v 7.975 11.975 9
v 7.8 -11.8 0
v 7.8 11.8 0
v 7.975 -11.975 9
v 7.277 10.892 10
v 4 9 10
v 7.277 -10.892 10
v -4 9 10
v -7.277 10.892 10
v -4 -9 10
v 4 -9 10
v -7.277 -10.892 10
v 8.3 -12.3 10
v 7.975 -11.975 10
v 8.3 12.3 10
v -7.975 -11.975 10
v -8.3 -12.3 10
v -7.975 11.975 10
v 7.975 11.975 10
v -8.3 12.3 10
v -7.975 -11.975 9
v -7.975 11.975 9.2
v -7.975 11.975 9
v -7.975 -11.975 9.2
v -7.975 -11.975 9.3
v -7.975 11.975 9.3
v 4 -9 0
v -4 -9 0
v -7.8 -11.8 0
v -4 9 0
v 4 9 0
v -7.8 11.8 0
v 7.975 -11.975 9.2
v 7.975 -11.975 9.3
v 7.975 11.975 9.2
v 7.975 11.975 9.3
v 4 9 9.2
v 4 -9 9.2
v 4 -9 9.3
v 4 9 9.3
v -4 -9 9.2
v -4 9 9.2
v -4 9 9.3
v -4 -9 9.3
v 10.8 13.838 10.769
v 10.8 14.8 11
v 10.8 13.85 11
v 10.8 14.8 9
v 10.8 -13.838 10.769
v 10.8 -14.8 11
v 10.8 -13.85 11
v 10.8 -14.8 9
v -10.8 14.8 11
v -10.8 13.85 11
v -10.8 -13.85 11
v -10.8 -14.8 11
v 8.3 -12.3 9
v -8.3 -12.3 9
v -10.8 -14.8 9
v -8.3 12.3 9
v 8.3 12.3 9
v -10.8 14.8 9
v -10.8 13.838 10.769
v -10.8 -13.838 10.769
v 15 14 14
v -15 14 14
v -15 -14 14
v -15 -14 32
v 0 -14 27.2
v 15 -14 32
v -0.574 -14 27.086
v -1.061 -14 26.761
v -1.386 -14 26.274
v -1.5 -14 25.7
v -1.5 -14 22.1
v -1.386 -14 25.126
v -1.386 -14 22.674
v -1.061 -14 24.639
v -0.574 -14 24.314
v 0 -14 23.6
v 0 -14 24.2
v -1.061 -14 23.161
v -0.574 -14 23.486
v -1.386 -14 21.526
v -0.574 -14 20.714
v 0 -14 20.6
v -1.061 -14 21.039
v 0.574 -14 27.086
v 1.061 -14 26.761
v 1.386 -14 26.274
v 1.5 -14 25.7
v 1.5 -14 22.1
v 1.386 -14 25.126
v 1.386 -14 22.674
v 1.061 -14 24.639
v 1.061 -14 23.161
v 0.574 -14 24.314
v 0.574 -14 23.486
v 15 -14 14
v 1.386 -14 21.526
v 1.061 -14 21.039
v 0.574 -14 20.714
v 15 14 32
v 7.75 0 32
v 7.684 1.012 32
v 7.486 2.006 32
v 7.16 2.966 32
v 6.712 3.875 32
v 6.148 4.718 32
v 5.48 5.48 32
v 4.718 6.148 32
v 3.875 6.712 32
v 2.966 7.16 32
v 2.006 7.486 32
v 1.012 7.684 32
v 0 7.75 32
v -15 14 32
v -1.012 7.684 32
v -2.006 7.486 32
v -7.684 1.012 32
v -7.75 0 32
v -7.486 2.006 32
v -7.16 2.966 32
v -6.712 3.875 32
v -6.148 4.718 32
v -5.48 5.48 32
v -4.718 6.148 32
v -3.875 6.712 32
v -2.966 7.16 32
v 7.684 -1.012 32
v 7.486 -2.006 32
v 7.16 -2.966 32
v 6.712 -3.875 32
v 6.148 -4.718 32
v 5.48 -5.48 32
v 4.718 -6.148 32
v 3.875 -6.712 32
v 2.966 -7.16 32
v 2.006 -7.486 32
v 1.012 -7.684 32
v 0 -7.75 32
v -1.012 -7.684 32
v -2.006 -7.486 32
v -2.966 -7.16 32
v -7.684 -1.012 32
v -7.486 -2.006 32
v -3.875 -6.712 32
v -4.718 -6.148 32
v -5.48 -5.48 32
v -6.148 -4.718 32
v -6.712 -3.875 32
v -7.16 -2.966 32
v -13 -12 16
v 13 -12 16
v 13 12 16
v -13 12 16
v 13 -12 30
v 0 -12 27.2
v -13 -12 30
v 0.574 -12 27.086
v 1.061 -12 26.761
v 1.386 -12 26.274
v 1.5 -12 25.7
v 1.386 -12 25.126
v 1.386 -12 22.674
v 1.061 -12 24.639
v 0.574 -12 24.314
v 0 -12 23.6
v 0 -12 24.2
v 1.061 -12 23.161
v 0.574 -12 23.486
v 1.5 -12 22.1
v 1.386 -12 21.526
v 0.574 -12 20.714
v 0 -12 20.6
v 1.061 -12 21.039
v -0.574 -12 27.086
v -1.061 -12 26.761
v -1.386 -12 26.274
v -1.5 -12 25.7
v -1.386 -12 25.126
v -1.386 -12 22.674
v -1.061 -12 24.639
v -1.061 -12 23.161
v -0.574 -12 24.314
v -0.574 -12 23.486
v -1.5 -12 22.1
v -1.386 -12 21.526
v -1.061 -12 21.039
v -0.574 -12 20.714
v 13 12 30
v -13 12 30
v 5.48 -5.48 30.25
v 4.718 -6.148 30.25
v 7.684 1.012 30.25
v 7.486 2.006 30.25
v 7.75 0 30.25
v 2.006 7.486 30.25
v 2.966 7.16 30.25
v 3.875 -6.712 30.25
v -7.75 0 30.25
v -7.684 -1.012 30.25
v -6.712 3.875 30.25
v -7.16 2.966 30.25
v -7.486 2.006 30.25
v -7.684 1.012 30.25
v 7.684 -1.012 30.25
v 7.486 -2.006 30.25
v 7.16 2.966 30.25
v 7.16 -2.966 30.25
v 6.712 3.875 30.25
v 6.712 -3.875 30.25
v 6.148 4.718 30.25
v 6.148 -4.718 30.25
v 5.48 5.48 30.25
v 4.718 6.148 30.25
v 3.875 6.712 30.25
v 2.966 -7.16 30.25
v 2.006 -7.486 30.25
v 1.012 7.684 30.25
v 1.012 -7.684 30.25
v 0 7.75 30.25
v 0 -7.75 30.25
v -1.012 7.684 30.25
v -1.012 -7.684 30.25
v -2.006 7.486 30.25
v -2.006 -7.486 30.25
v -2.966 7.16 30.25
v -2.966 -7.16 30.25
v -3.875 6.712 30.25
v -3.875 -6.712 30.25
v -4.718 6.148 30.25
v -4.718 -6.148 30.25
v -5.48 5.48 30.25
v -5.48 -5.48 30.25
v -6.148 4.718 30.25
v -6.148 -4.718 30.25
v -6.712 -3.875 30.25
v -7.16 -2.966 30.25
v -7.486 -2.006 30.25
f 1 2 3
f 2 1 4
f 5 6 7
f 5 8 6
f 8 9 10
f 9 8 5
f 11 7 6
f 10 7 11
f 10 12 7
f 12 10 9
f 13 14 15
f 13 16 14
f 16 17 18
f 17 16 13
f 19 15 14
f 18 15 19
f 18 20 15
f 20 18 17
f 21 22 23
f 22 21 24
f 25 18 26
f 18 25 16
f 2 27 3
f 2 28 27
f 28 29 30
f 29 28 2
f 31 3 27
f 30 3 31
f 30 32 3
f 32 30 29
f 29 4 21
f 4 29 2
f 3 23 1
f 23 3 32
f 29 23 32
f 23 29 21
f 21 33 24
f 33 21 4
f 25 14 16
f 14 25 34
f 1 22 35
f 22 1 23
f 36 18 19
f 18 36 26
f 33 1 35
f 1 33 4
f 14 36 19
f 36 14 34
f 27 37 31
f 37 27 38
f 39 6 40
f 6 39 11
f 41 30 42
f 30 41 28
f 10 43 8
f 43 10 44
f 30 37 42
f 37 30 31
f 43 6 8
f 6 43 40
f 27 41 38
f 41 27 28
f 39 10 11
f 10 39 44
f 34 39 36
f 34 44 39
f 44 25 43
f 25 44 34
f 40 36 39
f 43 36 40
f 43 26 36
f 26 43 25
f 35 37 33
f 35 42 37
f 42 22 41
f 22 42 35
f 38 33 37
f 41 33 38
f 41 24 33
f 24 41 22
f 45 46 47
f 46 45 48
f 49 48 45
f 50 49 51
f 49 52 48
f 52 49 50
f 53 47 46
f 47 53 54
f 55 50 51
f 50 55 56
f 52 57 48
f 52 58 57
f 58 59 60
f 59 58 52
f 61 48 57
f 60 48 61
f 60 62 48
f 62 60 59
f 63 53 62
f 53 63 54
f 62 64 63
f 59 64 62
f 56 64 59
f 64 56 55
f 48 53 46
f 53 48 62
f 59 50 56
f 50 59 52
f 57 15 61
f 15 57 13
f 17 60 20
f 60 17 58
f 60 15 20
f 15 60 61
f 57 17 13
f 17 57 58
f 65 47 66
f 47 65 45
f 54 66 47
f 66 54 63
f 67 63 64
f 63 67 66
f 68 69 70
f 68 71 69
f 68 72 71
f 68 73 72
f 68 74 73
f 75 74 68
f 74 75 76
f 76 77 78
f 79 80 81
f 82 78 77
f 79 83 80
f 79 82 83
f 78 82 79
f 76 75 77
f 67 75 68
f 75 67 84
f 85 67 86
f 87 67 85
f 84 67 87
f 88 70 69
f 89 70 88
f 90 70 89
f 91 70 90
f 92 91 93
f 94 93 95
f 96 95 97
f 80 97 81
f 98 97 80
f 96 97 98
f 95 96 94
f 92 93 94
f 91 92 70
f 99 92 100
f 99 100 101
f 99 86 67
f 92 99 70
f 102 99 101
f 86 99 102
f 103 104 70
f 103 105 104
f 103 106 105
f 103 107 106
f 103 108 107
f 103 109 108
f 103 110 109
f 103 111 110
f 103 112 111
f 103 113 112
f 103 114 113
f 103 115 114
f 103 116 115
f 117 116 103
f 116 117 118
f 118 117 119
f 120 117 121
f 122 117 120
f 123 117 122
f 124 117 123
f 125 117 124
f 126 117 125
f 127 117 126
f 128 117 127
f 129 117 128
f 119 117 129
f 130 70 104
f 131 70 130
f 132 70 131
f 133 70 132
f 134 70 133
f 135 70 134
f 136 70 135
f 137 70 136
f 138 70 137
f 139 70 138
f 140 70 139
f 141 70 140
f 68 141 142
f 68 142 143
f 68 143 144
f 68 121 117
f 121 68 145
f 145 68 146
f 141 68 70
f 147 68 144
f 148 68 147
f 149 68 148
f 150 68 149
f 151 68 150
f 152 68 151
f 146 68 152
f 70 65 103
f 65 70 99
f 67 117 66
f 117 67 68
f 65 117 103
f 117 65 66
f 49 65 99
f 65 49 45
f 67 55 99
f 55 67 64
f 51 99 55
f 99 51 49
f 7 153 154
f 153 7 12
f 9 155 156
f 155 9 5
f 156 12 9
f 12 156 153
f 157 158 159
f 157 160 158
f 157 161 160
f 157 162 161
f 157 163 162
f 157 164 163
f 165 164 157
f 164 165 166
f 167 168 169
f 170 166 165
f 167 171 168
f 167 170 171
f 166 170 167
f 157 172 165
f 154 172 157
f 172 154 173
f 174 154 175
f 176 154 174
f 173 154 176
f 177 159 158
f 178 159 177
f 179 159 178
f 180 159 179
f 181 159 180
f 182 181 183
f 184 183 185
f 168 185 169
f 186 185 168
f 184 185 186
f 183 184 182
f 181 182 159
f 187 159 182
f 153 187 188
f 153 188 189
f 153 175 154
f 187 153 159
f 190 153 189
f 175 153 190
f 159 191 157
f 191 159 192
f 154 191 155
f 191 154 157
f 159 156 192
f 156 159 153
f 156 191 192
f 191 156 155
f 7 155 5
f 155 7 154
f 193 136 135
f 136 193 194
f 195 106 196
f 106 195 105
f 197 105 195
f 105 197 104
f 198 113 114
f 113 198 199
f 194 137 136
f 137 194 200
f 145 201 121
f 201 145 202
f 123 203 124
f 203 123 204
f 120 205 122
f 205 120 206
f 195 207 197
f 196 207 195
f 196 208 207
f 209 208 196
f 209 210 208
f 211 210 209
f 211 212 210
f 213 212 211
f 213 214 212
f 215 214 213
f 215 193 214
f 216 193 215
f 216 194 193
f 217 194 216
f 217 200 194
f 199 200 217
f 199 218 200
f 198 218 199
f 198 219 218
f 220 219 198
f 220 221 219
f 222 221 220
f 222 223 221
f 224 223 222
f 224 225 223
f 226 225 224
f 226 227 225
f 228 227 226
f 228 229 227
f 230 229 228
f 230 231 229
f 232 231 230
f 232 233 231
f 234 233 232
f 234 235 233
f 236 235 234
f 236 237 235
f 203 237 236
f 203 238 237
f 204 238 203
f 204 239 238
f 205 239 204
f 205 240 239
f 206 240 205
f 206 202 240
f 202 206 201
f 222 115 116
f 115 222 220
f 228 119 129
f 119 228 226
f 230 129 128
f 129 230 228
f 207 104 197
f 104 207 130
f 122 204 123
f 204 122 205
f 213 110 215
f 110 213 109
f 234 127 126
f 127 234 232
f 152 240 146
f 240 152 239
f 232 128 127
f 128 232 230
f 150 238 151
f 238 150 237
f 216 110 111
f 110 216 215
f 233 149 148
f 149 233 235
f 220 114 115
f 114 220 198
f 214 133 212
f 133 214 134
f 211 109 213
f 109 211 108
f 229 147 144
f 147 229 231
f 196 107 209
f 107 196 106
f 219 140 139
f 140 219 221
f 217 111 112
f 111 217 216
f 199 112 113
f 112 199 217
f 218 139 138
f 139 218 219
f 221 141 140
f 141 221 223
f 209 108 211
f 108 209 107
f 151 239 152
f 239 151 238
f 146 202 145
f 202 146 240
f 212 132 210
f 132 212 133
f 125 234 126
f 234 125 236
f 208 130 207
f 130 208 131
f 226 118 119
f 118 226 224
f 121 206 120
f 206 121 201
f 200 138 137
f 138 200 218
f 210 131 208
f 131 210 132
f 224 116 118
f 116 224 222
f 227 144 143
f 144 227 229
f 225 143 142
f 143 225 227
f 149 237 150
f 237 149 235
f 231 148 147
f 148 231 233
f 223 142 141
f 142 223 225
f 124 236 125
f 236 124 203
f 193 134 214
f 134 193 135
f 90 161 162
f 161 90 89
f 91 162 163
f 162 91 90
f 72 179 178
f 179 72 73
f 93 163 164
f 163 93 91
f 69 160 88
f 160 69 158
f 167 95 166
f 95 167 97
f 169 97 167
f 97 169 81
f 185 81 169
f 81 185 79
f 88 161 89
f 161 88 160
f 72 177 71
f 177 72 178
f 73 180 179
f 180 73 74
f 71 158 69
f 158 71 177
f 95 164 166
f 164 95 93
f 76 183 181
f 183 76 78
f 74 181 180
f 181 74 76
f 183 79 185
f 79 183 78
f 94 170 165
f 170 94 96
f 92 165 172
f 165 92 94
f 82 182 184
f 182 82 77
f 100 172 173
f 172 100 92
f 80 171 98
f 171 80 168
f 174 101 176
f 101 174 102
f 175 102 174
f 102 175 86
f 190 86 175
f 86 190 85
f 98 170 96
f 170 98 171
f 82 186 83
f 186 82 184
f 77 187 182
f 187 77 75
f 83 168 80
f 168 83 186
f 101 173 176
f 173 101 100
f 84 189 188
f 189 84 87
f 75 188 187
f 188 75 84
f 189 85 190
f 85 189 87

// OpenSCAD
// file: sleds.scad
// ==========================================
// Xentient Framework - Universal Sled & Socket Library
// Shared modules for all peripheral caps
// ==========================================
// Per Framework §2: Universal Mating Protocol
// Female Socket (in hub): 24.4×16.4×10.0mm (0.4mm clearance), wire channel 18×8mm
// Male Sled (on cap base): 23.6×15.6×10.0mm, 1° draft, hollow 18×8mm
// Flange: +3mm each side (increased from +2mm for bearing strength)
// Units: mm

$fn = 64;

// ==========================================
// MALE SLED PARAMETERS
// ==========================================

Sled_W       = 23.6;    // Width (0.4mm tolerance in female 24.0mm)
Sled_H       = 15.6;    // Height (0.4mm tolerance in female 16.0mm)
Sled_D       = 10.0;    // Depth (insertion length)
Sled_Draft   = 1.0;     // 1-degree draft angle
Sled_Wire_W  = 18.0;    // Wire pass-through width
Sled_Wire_H  = 8.0;     // Wire pass-through height
Sled_Wall    = 2.0;     // Minimum wall thickness

// Derived
Sled_Draft_Off = Sled_D * tan(Sled_Draft);  // ~0.17mm per side

// ==========================================
// MODULE: male_sled()
// The plug base that inserts into the hub's female socket.
// All caps start with this at their base.
//
// Usage: difference() { male_sled(); /* your cap-specific cutouts */ }
// ==========================================

module male_sled() {
    difference() {
        // Outer body with 1° draft
        hull() {
            // Entry face (slightly larger for wedge fit)
            translate([0, 0, Sled_D - 0.5])
                cube([Sled_H + 2*Sled_Draft_Off,
                      Sled_W + 2*Sled_Draft_Off,
                      1], center=true);
            // Inner face (exact size)
            translate([0, 0, 0.5])
                cube([Sled_H, Sled_W, 1], center=true);
        }

        // Wire pass-through (hollow core)
        translate([0, 0, Sled_D / 2])
            cube([Sled_Wire_H, Sled_Wire_W, Sled_D + 2], center=true);

        // Entry chamfer (45° for easy insertion)
        chamfer_h = 1.5;
        translate([0, 0, Sled_D - chamfer_h/2])
            hull() {
                cube([Sled_H + 2*chamfer_h, Sled_W + 2*chamfer_h, 0.1], center=true);
                cube([Sled_H, Sled_W, 0.1], center=true);
            }
    }
}

// ==========================================
// MODULE: male_sled_with_flange()
// Adds a flange around the sled base for cap-to-hub transition.
// Flange sits flush against hub exterior face.
//
// flange_w: extra width beyond sled on each side
// flange_h: extra height beyond sled on each side
// flange_t: flange thickness
// ==========================================

module male_sled_with_flange(flange_w=3.0, flange_h=3.0, flange_t=2.0) {
    union() {
        male_sled();

        // Flange ring around sled entry
        translate([0, 0, Sled_D])
            difference() {
                cube([Sled_H + 2*flange_h,
                      Sled_W + 2*flange_w,
                      flange_t], center=true);
                // Cut sled opening through flange
                cube([Sled_H + 1, Sled_W + 1, flange_t + 2], center=true);
            }
    }
}

// ==========================================
// MODULE: wire_channel()
// Internal wire routing channel from sled to component.
// Extends from sled core outward through the cap body.
//
// length: distance from sled to component
// direction: "straight" or "angled"
// ==========================================

module wire_channel(length=15, direction="straight") {
    if (direction == "straight") {
        translate([0, 0, Sled_D / 2 + length / 2])
            cube([Sled_Wire_H, Sled_Wire_W, length + 1], center=true);
    }
}

// ==========================================
// VISUALIZATION HELPERS
// ==========================================

// Render just the sled for testing
// male_sled();
// main file
// ==========================================
// Xentient Framework - Housing 4: Motion (HC-SR501 PIR)
// Recessed shroud with Fresnel lens cutout and adjustment holes
// ==========================================
// Component: HC-SR501 PIR (23×23mm board, 15mm dome)
// Connection: 4-pin JST XH pigtail (VCC, GND, OUT, NC)
//              3 active pins, 4th unused (3-pin JST not in BOM)
// Socket: 210° face (human detection height)
// Per Framework §4 Housing 4
// Units: mm

include <sleds.scad>;

$fn = 64;

// ==========================================
// COMPONENT DIMENSIONS
// ==========================================

PIR_Board_W  = 23.0;   // HC-SR501 board width
PIR_Board_H  = 23.0;   // HC-SR501 board height (roughly square)
PIR_Board_T  = 1.6;    // PCB thickness
PIR_Dome_Dia = 15.0;   // Fresnel lens dome diameter
PIR_Dome_H   = 12.0;   // Dome height above board
PIR_Clear    = 0.4;    // Clearance per side

// Potentiometer access holes
Pot_Dia      = 3.0;    // Access hole diameter for screwdriver
Pot_Offset_X = 5.5;    // Distance from board center to pot center
Pot_Offset_Y = 7.0;    // Forward offset

// Housing dimensions
Shroud_W     = 28.0;   // Width of shroud (23mm board + walls)
Shroud_H     = 30.0;   // Height of shroud
Shroud_D     = 18.0;   // Depth of shroud (dome clearance)
House_Wall   = 2.0;    // Wall thickness
Lens_Cutout  = 15.5;   // 15mm dome + 0.5mm clearance
House_Wall2  = 1.5;    // Thin wall near lens dome

// ==========================================
// MODULE: housing_motion()
// ==========================================

module housing_motion() {
    union() {
        // Sled base with flange
        male_sled_with_flange(flange_w=3.0, flange_h=3.0, flange_t=2.0);

        // Recessed shroud body
        translate([0, 0, Sled_D]) {
            difference() {
                // Outer shroud
                hull() {
                    // Transition from sled
                    translate([0, 0, 1])
                        cube([Sled_H + 4, Sled_W + 4, 2], center=true);
                    // Shroud body
                    translate([0, 0, Shroud_D / 2 + 4])
                        cube([Shroud_H, Shroud_W, Shroud_D], center=true);
                }

                // Inner cavity
                hull() {
                    translate([0, 0, 0.5])
                        cube([Sled_H - 2, Sled_W - 2, 2], center=true);
                    translate([0, 0, Shroud_D / 2 + 4])
                        cube([Shroud_H - 2*House_Wall, Shroud_W - 2*House_Wall,
                              Shroud_D - 2*House_Wall], center=true);
                }

                // Fresnel lens dome cutout (front face)
                // 15.5mm circular hole allowing dome to protrude
                translate([0, 0, Shroud_D + 4])
                    cylinder(h=House_Wall2 + 2, d=Lens_Cutout, center=true, $fn=48);

                // Recessed shelf for PIR board (sits inside shroud)
                translate([0, 0, Shroud_D * 0.4 + 4])
                    difference() {
                        cube([PIR_Board_W + PIR_Clear, PIR_Board_H + PIR_Clear, 3], center=true);
                        // Center cutout (board sits on shelf edges)
                        translate([0, 0, 1.5])
                            cube([PIR_Board_W - 2, PIR_Board_H - 2, 3], center=true);
                    }

                // Wire channel
                translate([0, 0, -2])
                    cube([Sled_Wire_H, Sled_Wire_W, Shroud_D + 8], center=true);

                // ===== POTENTIOMETER ACCESS HOLES =====
                // Two 3mm holes on side wall for Sensitivity and Delay adjustment
                // Left side: Sensitivity pot
                translate([0, -Shroud_W/2 - 1, Shroud_D * 0.65 + 4])
                    rotate([90, 0, 0])
                        cylinder(h=House_Wall + 4, d=Pot_Dia, center=true, $fn=16);
                // Left side: Delay pot (offset from first)
                translate([0, -Shroud_W/2 - 1, Shroud_D * 0.45 + 4])
                    rotate([90, 0, 0])
                        cylinder(h=House_Wall + 4, d=Pot_Dia, center=true, $fn=16);
            }
        }
    }
}

// ==========================================
// RENDER
// ==========================================

housing_motion();
